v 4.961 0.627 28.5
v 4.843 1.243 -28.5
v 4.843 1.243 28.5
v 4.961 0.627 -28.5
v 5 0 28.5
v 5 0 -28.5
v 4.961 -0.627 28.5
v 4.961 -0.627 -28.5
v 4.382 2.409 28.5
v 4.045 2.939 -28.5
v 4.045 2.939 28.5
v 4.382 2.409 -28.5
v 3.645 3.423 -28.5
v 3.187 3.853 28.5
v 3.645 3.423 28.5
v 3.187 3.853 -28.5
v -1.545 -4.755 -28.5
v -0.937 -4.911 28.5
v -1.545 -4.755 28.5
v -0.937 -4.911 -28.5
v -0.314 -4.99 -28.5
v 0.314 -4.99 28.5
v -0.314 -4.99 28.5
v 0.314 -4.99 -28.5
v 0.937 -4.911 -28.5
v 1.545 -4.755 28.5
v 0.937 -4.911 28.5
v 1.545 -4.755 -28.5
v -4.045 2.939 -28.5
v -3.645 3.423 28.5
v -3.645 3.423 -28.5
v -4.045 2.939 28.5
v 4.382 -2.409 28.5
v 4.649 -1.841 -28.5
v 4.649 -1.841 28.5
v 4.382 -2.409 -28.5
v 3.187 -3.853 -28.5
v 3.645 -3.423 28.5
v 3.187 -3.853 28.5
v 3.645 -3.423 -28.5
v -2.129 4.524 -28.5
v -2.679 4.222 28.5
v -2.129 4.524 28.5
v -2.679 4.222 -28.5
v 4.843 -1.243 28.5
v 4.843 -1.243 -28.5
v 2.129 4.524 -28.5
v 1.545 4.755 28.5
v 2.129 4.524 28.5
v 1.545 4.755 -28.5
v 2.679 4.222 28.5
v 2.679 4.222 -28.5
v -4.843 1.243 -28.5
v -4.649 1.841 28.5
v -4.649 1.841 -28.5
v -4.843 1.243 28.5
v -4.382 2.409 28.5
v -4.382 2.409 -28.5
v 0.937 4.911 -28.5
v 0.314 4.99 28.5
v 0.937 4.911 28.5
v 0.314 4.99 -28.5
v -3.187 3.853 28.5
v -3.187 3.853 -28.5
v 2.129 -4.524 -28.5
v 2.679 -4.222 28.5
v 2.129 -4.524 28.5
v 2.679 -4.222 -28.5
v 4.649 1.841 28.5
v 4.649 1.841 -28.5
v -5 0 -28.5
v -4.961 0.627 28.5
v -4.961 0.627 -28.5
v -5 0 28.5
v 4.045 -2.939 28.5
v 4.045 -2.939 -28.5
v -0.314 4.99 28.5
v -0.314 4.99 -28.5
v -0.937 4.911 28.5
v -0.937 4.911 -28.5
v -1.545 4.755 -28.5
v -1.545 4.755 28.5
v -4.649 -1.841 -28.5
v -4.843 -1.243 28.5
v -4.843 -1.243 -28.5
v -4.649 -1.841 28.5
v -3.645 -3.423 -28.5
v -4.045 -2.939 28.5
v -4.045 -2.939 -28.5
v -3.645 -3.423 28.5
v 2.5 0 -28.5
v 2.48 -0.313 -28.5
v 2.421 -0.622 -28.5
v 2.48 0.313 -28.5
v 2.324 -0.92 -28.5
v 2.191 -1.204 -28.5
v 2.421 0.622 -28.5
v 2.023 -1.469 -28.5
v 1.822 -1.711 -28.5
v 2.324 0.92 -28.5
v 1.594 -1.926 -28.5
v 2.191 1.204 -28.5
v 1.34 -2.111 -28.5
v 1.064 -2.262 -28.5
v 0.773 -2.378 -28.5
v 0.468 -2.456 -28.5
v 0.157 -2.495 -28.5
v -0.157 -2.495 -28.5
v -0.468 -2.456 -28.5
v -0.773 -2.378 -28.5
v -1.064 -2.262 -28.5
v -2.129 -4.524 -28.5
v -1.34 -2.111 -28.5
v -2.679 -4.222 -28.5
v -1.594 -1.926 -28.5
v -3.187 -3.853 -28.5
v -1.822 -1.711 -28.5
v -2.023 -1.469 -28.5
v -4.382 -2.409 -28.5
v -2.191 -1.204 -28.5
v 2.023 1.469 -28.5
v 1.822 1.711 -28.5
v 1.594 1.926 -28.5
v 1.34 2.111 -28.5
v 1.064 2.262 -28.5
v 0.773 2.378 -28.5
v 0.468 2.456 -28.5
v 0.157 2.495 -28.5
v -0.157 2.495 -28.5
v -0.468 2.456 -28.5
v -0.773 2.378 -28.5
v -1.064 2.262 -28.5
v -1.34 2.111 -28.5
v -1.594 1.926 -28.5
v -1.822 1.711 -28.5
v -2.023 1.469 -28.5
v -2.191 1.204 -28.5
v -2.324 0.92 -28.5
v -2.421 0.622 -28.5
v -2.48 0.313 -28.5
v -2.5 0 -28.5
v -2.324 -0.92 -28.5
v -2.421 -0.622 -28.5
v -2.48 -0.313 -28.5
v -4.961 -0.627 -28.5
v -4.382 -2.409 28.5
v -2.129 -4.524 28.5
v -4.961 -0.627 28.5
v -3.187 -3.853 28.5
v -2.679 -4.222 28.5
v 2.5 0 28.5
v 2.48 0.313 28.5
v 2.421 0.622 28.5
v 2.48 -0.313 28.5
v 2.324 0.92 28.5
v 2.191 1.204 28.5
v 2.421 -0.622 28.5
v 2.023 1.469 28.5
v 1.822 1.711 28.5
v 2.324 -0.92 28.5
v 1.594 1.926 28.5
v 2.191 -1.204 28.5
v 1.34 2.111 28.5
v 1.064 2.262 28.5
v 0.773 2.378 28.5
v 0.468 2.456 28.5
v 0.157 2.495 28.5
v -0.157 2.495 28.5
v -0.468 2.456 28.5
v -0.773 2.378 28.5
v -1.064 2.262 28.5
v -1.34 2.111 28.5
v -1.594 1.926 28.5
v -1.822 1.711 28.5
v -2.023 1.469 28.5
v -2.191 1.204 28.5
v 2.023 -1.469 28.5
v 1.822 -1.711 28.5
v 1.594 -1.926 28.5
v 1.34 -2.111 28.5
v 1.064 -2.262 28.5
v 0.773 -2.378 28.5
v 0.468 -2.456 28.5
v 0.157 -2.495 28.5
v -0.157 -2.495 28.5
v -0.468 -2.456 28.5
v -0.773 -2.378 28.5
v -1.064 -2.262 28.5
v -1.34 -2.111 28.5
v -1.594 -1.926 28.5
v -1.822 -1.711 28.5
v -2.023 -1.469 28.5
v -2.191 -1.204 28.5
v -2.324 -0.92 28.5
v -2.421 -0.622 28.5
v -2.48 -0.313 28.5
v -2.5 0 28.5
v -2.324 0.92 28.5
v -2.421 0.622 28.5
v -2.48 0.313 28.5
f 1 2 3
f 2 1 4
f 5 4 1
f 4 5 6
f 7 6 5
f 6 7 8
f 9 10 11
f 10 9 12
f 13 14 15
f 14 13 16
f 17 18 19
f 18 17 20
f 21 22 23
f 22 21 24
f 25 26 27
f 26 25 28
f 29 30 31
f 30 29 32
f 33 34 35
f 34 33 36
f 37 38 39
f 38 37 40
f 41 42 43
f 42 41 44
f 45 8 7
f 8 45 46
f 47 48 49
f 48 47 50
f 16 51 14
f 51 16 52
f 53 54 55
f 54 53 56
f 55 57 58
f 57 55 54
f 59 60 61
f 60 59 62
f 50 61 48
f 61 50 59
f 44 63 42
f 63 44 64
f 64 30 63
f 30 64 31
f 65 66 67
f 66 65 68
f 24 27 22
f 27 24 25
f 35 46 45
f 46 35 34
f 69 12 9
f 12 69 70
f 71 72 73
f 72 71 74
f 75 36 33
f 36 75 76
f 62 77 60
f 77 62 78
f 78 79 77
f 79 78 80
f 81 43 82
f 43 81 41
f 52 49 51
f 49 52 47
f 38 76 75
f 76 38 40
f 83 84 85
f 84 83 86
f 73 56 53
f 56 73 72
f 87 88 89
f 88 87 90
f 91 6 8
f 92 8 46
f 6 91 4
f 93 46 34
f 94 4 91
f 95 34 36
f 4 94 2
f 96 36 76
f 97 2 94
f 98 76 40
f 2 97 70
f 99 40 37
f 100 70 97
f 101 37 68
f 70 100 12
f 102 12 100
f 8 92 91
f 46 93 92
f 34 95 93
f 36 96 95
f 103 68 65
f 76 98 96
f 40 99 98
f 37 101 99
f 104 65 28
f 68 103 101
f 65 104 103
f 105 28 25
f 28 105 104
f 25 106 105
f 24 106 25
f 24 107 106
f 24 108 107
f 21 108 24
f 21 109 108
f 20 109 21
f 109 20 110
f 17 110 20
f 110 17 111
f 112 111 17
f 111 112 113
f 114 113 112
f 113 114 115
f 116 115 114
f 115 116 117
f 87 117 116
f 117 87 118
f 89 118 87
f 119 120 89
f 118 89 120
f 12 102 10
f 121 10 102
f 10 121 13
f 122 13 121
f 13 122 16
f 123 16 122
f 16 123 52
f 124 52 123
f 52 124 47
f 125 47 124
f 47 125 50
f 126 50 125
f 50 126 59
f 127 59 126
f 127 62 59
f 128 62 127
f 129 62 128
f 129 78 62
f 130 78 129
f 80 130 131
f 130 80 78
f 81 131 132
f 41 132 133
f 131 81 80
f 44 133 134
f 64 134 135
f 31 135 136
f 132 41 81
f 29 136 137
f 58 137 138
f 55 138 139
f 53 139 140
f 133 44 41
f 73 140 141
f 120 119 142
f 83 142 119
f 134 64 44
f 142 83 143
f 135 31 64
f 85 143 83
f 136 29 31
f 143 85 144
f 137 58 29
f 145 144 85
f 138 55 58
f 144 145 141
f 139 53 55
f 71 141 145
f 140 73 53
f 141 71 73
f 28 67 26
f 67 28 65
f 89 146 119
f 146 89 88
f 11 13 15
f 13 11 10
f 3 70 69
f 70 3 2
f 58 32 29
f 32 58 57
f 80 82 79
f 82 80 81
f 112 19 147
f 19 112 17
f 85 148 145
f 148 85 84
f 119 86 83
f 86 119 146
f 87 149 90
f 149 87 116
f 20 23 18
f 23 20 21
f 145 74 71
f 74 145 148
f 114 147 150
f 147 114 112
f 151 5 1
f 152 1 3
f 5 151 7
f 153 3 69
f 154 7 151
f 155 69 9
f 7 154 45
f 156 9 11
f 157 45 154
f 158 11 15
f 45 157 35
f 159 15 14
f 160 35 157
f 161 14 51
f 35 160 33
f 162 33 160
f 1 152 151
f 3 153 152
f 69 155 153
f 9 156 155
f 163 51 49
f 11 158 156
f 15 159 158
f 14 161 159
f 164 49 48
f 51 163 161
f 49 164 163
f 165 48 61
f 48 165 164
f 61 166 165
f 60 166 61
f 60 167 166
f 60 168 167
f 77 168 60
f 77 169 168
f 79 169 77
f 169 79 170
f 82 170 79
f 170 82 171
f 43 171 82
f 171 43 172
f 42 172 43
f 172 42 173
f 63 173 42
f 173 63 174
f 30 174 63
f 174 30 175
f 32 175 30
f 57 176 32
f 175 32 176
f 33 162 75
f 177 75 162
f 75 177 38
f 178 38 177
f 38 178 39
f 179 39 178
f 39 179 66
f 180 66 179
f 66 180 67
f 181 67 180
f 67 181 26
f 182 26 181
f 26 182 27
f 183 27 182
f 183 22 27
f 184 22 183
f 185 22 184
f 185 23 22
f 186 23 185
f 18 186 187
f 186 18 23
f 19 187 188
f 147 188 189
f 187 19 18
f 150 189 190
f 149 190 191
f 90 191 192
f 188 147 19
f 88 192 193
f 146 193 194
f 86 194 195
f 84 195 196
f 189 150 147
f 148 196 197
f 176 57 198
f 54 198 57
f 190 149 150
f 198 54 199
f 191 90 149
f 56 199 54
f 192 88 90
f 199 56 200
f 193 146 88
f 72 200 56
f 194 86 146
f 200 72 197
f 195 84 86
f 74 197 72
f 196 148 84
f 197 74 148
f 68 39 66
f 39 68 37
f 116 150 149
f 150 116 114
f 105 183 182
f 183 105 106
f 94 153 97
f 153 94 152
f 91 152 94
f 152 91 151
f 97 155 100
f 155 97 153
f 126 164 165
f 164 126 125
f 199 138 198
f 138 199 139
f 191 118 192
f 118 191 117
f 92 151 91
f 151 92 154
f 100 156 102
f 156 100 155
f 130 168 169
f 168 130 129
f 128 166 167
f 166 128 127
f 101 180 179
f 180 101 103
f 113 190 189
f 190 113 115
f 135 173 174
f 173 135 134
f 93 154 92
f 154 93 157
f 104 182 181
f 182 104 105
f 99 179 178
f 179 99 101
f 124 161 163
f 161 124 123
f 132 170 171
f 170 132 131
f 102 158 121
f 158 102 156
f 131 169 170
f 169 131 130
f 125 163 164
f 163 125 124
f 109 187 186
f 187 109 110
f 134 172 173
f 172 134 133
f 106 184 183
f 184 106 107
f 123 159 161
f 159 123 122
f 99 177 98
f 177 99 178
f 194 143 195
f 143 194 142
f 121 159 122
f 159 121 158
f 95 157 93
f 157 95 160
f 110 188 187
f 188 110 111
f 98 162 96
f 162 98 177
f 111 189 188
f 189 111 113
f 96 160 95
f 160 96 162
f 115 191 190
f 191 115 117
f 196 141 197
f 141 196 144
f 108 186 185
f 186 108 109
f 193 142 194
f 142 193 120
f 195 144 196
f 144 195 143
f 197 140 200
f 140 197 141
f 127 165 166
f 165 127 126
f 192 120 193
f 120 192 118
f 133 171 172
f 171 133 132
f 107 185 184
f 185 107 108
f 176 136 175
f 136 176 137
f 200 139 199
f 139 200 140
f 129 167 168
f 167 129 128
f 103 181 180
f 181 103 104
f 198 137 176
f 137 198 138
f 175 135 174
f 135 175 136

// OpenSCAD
$fn = 50;


difference() {
	union() {
		translate(v = [0, 0, -28.5000000000]) {
			cylinder(h = 57, r = 5.0000000000);
		}
	}
	union() {
		translate(v = [0, 0, -100.0000000000]) {
			cylinder(h = 200, r = 2.5000000000);
		}
	}
}
